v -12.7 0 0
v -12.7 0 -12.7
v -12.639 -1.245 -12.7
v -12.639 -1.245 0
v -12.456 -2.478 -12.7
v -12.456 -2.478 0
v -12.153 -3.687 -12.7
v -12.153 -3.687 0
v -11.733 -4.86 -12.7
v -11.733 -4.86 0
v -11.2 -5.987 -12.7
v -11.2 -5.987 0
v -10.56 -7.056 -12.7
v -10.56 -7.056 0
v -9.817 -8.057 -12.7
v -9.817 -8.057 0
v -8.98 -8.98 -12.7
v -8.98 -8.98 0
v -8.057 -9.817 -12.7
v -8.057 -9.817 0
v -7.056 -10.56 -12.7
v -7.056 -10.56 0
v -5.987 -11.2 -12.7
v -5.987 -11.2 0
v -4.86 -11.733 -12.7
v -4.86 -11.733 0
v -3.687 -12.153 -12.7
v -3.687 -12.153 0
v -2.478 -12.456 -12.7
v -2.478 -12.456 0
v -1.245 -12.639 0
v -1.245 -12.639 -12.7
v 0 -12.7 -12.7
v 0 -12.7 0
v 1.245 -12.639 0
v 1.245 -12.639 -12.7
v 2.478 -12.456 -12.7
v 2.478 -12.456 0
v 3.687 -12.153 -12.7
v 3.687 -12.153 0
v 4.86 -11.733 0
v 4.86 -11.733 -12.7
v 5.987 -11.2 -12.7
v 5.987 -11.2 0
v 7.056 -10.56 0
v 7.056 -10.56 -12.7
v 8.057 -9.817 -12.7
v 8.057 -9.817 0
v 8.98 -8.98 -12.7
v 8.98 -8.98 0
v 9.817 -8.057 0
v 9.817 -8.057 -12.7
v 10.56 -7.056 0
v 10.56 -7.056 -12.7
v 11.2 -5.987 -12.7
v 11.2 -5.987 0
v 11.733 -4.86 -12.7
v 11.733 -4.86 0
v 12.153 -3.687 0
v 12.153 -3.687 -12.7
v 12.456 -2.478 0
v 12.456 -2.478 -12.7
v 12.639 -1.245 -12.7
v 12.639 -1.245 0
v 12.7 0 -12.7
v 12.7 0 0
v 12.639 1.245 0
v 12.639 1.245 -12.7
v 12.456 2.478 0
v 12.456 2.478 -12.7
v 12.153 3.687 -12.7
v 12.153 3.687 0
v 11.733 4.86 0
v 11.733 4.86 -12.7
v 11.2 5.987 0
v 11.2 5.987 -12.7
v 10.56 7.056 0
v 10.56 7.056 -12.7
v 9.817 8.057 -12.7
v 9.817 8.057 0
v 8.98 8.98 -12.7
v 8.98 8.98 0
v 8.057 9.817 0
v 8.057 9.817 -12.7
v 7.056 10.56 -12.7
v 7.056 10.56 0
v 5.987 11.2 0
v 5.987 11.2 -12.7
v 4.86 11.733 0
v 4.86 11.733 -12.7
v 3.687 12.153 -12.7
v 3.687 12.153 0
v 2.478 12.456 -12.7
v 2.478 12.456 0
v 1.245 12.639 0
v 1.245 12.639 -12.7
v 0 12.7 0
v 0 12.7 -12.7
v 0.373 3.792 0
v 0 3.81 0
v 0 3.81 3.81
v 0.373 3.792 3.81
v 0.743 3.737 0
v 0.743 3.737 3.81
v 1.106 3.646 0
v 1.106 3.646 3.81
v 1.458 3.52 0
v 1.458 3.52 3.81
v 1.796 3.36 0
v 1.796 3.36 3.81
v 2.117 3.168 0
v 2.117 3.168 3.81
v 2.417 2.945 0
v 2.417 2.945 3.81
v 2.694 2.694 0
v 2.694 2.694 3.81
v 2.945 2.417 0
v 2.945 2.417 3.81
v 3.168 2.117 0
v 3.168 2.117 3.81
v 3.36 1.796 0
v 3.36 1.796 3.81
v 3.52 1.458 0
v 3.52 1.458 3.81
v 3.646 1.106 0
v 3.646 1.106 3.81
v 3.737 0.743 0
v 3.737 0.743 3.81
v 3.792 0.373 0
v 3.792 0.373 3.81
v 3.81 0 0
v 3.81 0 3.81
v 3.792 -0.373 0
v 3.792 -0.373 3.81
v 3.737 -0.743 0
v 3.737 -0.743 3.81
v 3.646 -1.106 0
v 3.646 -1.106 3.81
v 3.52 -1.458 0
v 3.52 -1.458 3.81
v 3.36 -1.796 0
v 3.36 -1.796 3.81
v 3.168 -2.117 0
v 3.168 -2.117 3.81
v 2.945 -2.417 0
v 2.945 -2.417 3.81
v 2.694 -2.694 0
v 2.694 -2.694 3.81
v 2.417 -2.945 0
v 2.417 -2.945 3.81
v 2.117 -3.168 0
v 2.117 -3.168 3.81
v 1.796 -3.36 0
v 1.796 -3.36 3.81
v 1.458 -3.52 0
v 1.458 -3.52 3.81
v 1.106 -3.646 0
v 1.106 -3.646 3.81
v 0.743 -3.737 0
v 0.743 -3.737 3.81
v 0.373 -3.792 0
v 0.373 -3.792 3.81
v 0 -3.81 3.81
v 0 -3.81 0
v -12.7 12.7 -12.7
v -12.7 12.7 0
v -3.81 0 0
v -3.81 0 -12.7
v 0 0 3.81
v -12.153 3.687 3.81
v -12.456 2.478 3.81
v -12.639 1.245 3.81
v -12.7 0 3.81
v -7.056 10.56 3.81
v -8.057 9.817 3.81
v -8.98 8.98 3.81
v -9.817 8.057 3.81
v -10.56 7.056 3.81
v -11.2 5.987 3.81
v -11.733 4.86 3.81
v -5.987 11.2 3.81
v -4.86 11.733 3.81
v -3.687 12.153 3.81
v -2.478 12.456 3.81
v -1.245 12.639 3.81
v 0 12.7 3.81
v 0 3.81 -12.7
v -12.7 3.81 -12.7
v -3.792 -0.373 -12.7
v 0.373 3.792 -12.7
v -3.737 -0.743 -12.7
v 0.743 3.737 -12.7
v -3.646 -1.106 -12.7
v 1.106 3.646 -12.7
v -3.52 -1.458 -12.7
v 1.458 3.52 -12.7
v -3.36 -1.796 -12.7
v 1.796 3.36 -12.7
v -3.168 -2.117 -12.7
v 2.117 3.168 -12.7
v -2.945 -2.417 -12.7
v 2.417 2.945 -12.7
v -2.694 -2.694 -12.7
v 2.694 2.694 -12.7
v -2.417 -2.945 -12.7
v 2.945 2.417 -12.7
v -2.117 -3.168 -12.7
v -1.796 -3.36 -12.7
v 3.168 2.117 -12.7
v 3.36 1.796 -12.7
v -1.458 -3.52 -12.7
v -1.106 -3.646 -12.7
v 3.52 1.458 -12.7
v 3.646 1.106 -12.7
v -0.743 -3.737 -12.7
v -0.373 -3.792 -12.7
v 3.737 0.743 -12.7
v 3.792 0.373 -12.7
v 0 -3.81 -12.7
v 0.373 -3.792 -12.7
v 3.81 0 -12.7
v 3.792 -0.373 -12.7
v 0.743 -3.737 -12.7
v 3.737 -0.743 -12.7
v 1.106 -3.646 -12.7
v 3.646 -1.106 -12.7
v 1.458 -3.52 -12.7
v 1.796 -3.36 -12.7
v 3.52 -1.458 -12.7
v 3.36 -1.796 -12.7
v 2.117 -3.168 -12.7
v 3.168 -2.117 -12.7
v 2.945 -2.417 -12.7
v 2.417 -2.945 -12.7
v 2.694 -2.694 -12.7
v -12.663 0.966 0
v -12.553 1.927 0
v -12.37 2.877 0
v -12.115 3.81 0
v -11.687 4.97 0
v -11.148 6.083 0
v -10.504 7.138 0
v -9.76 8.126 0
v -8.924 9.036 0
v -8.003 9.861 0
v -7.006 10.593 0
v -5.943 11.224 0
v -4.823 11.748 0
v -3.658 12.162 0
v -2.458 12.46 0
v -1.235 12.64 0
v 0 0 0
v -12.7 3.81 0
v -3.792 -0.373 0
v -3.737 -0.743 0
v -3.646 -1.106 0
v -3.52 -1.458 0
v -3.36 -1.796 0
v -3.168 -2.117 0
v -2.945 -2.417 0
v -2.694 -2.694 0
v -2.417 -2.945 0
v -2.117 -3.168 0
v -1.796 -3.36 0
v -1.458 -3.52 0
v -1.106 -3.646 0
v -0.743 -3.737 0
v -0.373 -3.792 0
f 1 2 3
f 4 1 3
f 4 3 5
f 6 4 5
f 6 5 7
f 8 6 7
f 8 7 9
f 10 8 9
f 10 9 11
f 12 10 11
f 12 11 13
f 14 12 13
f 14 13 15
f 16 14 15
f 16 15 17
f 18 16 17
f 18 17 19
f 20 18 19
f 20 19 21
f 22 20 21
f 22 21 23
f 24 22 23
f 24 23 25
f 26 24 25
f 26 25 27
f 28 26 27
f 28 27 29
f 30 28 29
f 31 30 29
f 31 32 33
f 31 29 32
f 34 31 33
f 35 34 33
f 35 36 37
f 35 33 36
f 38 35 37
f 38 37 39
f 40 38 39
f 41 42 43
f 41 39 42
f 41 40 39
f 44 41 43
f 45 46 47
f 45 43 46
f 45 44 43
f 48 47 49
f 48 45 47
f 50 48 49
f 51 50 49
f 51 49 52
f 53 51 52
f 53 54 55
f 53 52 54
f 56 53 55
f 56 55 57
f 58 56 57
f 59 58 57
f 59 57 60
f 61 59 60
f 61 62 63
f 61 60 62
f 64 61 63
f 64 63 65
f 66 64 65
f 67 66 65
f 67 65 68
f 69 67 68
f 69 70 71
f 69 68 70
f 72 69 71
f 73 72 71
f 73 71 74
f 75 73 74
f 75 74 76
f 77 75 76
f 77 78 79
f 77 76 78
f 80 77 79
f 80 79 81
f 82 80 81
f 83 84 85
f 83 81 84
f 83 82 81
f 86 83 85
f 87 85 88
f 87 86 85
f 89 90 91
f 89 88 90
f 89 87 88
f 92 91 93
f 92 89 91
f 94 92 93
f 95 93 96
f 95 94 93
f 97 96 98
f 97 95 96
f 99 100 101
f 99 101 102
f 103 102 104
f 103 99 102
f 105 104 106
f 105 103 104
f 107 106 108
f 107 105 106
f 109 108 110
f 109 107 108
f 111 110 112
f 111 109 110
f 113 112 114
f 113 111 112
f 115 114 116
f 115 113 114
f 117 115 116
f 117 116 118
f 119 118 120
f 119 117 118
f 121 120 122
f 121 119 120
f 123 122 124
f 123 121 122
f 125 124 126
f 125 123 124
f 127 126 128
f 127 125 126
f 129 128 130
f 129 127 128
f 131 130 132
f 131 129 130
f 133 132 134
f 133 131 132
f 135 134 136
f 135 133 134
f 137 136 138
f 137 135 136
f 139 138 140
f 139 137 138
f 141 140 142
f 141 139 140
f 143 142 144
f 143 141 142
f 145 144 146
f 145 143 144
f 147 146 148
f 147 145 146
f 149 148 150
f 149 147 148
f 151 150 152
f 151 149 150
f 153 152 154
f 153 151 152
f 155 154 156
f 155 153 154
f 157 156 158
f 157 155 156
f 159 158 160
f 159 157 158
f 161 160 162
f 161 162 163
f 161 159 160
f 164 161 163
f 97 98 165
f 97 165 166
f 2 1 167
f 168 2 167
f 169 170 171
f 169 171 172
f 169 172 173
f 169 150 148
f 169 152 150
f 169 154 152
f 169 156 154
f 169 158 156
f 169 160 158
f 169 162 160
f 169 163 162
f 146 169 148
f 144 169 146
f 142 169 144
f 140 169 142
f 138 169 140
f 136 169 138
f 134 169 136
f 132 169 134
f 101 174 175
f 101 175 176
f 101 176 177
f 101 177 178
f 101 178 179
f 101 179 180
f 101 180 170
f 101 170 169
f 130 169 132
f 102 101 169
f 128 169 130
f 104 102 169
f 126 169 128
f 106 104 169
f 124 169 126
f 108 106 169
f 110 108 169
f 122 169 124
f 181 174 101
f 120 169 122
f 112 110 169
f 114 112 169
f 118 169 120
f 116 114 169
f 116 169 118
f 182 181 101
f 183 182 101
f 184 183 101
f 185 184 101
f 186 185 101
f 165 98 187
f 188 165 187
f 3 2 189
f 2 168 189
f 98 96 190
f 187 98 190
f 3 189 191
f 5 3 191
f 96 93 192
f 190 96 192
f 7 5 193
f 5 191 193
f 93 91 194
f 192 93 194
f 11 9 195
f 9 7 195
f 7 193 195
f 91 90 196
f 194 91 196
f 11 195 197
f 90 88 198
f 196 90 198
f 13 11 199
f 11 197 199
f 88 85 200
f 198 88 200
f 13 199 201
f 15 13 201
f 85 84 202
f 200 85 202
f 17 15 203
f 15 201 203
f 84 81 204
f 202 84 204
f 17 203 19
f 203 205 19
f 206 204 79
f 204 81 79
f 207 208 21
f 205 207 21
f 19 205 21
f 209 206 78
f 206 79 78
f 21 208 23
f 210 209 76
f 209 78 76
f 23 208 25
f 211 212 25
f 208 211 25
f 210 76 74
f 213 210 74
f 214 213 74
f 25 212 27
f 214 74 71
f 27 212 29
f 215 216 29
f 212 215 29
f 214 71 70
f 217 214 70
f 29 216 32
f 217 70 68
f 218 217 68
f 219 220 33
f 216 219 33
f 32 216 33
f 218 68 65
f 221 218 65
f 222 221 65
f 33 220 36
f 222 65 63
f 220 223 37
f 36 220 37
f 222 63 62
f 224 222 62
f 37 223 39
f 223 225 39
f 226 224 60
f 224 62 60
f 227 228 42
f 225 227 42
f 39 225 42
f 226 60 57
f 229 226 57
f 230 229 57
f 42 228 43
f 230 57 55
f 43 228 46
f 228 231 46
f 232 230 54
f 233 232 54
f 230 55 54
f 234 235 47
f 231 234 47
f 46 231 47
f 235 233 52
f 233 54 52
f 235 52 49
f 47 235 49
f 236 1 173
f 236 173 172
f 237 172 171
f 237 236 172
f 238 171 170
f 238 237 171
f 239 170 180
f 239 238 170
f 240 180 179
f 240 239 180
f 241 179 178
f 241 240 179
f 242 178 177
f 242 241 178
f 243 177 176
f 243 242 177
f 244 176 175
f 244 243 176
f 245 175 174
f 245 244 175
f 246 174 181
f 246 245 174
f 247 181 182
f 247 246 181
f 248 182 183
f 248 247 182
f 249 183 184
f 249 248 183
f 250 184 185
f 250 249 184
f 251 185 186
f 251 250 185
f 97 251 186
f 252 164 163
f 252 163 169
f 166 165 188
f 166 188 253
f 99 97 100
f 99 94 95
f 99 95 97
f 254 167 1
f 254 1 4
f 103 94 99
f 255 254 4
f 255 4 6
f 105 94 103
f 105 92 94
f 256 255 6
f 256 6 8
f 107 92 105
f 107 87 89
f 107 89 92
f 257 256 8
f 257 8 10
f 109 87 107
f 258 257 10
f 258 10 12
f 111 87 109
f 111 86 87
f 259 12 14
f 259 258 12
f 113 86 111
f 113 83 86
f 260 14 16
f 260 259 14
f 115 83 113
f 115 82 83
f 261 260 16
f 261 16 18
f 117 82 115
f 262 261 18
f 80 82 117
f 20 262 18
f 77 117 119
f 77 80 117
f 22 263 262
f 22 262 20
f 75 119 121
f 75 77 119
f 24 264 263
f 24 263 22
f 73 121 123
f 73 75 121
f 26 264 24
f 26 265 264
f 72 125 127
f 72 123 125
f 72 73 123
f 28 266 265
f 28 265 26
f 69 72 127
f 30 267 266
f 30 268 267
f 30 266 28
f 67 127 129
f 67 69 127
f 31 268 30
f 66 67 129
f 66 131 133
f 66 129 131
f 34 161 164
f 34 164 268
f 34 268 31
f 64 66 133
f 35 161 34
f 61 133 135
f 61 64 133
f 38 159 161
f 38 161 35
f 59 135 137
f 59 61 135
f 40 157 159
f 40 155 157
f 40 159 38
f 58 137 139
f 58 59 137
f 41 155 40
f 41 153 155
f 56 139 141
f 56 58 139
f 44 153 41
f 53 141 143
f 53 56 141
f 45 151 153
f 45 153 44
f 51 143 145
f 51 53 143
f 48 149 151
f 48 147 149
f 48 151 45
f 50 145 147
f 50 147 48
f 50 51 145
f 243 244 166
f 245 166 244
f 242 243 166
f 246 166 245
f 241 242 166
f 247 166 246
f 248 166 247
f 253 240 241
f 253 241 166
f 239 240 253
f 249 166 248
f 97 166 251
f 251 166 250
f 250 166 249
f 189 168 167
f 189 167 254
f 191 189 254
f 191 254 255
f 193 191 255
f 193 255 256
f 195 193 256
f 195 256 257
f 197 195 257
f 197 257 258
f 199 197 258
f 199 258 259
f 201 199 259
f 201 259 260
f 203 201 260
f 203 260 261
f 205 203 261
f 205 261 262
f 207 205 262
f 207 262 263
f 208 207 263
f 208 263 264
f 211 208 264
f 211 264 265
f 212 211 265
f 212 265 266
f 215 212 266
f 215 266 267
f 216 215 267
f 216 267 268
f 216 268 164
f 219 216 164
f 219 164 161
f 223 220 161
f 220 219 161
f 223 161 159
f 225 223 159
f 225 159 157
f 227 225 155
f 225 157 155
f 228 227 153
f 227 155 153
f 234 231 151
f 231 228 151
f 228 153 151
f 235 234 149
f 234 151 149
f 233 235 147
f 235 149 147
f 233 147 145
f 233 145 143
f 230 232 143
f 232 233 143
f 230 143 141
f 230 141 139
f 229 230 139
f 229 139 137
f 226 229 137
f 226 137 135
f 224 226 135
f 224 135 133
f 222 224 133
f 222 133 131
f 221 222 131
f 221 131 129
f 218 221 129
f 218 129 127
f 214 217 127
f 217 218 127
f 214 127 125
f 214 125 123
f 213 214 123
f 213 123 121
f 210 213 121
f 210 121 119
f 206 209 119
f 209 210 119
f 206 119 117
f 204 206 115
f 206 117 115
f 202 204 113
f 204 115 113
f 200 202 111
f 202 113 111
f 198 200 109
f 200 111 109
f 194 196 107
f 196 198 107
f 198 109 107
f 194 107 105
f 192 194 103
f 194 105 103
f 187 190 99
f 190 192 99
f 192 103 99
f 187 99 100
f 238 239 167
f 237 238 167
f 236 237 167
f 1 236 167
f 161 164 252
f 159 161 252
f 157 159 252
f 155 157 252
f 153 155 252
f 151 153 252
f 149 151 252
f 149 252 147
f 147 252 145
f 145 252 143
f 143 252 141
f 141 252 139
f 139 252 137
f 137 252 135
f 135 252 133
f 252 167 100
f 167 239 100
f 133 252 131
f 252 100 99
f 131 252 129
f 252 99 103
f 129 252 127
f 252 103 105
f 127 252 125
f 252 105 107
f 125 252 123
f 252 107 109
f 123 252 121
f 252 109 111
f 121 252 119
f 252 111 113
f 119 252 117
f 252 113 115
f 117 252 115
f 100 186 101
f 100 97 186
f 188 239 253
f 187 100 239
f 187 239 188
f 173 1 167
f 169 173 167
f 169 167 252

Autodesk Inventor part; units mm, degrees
ref_plane "YZ Plane" through (0, 0, 0) normal (1, 0, 0) x (0, 1, 0)
ref_plane "XZ Plane" through (0, 0, 0) normal (0, 1, 0) x (-1, 0, 0)
ref_plane "XY Plane" through (0, 0, 0) normal (0, 0, 1) x (1, 0, 0)
sketch "Sketch1" plane through (0, 0, 0) normal (0, 0, 1) x (1, 0, 0)
  circle A0 centre (0, 0) radius 12.7
  circle A1 centre (0, 0) radius 3.81
  line L0 (0, 12.7) -> (0, 0)
  line L1 (0, 0) -> (12.7, 0)
  line L2 (0, -12.7) -> (0, 0)
  line L3 (-12.7, 0) -> (0, 0)
  line L4 (0, 3.81) -> (0, 0)
  line L5 (3.81, 0) -> (0, 0)
  line L6 (0, -3.81) -> (0, 0)
  line L7 (-3.81, 0) -> (0, 0)
  dimension "d0" = 25.4
  dimension "d1" = 7.62
extrude "Extrusion1" add sketch "Sketch1" against normal blind 12.7 contours L1 A1 L0 A0 | A0 L2 A1 L1 | L0 A1 L3 A0 | A0 L3 A1 L2
extrude "Extrusion2" cut sketch "Sketch1" against normal blind 12.7 contours L0 A1 L3 A0 | L0 L3 A1
sketch "Sketch2" plane through (0, 3.81, 0) normal (-1, 0, 0) x (0, 0, 1)
  line L0 (-12.7, 8.89) -> (-12.7, -16.51) projected
  line L1 (0, 0) -> (-12.7, 0) projected
  line L2 (-12.7, 8.89) -> (-12.7, 0)
  line L3 (-12.7, 0) -> (0, 0)
  line L4 (0, 8.89) -> (0, -16.51) projected
  line L5 (0, 0) -> (0, 8.89)
  line L6 (-12.7, 8.89) -> (0, 8.89) projected
  line L7 (0, 8.89) -> (-12.7, 8.89)
  point P0 (0, -3.81)
  point P1 (-12.7, -3.81)
extrude "Extrusion3" add sketch "Sketch2" along normal blind 12.7
extrude "Extrusion4" add sketch "Sketch1" along normal blind 3.81 contours A1 L2 L1 | L0 L3 A1
extrude "Extrusion5" add sketch "Sketch1" along normal blind 3.81 contours L1 L0 A1
extrude "Extrusion6" add sketch "Sketch1" along normal blind 3.81 contours L0 A1 L3 A0
properties part number "dope"
